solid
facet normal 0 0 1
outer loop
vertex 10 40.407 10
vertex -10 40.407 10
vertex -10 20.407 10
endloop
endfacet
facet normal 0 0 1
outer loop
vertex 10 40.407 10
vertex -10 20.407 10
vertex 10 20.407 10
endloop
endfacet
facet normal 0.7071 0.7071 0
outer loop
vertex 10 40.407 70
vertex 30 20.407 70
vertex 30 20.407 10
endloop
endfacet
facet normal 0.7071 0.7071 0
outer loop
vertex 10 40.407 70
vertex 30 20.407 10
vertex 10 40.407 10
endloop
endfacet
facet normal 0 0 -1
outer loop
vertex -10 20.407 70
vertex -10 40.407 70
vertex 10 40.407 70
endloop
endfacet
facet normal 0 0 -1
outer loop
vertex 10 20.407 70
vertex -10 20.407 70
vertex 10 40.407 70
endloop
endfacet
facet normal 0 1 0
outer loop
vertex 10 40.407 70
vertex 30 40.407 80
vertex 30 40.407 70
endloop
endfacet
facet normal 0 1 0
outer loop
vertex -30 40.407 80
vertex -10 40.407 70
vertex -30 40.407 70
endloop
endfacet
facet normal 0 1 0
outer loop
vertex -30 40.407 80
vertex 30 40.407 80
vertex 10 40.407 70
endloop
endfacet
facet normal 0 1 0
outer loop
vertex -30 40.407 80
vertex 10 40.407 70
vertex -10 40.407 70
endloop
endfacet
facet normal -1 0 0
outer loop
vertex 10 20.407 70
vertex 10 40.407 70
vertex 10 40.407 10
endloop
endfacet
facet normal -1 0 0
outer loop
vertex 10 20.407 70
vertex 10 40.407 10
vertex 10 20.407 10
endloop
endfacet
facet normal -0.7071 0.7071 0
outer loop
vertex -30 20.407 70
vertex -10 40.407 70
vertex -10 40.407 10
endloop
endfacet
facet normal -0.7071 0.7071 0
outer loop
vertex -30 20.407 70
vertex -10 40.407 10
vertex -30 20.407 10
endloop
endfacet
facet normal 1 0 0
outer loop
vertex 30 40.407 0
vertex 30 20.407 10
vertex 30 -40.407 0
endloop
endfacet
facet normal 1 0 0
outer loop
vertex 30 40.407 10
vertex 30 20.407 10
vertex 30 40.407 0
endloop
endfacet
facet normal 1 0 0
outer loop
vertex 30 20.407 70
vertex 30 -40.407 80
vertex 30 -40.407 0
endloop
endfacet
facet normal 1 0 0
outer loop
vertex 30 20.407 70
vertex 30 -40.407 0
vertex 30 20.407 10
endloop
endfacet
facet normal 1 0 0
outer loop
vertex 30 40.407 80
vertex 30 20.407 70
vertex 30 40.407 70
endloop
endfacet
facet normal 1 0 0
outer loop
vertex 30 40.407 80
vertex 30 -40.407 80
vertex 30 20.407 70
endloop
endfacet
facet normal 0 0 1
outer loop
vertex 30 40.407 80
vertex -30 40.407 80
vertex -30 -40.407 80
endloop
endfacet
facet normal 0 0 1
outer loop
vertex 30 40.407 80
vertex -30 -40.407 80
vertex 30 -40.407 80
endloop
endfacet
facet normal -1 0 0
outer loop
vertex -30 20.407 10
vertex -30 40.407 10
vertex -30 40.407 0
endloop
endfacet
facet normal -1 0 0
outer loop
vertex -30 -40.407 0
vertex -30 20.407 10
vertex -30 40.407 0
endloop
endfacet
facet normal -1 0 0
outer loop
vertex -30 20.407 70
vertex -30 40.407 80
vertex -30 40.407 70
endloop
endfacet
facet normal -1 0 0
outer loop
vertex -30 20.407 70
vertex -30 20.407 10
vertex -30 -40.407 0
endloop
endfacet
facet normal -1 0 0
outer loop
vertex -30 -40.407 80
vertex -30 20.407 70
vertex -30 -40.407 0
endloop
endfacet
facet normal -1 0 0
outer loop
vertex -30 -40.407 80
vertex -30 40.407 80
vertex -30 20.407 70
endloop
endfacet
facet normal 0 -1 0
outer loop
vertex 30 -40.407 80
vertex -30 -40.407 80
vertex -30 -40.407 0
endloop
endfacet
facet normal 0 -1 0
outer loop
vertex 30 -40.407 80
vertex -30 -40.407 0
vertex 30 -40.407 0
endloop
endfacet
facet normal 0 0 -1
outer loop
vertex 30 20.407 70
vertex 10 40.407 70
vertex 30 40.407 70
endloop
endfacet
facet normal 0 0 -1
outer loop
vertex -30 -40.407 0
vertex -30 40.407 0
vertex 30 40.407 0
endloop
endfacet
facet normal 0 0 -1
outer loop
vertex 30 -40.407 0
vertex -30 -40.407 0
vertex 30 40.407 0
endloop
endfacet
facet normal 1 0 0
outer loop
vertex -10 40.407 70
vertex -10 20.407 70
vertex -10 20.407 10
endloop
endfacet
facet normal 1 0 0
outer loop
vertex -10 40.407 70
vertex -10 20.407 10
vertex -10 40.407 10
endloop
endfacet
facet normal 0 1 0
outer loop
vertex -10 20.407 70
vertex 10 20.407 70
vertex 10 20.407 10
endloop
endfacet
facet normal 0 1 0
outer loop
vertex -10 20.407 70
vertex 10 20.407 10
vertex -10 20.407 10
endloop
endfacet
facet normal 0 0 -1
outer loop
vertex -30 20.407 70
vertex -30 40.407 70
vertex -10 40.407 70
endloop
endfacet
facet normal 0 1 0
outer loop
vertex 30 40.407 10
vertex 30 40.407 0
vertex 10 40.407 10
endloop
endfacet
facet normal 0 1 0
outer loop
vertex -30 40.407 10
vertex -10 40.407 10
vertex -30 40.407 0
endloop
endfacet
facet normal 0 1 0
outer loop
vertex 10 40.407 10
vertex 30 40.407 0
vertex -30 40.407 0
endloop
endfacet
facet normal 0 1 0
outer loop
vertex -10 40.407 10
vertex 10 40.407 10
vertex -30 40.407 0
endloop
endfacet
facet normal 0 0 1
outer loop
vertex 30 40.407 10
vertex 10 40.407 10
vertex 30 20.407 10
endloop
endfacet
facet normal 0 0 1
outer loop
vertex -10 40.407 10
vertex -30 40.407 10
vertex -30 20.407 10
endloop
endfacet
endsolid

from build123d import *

# Parameters (mm, degrees)
BOSS_EXTRUDE2_DEPTH = 40
SKETCH2_5_W         = 20
SKETCH2_5_H         = 20
BOSS_EXTRUDE3_DEPTH = 10


with BuildPart() as part:
    # Sketch2 → Boss-Extrude2 (new body)
    with BuildSketch(Plane.XY):
        Polygon((30, 20.406682394), (10, 40.406682394), (10, 20.406682394), (-10, 20.406682394), (-10, 40.406682394), (-30, 20.406682394), (-30, -40.406682394), (30, -40.406682394), align=None)
    extrude(amount=BOSS_EXTRUDE2_DEPTH)

    # Sketch2_5 → Boss-Extrude3 (add)
    with BuildSketch(Plane.XY):
        Polygon((-30, 20.406682394), (-10, 40.406682394), (-30, 40.406682394), align=None)
        with Locations((0, 30.406682394)):
            Rectangle(SKETCH2_5_W, SKETCH2_5_H)
        Polygon((30, 40.406682394), (10, 40.406682394), (30, 20.406682394), align=None)
    extrude(amount=BOSS_EXTRUDE3_DEPTH)

    # Mirror1: part across plane


with BuildPart() as part_1:
    add(part.part)
    add(part.part.mirror(Plane.XY.offset(40)))


solid = part_1.part
